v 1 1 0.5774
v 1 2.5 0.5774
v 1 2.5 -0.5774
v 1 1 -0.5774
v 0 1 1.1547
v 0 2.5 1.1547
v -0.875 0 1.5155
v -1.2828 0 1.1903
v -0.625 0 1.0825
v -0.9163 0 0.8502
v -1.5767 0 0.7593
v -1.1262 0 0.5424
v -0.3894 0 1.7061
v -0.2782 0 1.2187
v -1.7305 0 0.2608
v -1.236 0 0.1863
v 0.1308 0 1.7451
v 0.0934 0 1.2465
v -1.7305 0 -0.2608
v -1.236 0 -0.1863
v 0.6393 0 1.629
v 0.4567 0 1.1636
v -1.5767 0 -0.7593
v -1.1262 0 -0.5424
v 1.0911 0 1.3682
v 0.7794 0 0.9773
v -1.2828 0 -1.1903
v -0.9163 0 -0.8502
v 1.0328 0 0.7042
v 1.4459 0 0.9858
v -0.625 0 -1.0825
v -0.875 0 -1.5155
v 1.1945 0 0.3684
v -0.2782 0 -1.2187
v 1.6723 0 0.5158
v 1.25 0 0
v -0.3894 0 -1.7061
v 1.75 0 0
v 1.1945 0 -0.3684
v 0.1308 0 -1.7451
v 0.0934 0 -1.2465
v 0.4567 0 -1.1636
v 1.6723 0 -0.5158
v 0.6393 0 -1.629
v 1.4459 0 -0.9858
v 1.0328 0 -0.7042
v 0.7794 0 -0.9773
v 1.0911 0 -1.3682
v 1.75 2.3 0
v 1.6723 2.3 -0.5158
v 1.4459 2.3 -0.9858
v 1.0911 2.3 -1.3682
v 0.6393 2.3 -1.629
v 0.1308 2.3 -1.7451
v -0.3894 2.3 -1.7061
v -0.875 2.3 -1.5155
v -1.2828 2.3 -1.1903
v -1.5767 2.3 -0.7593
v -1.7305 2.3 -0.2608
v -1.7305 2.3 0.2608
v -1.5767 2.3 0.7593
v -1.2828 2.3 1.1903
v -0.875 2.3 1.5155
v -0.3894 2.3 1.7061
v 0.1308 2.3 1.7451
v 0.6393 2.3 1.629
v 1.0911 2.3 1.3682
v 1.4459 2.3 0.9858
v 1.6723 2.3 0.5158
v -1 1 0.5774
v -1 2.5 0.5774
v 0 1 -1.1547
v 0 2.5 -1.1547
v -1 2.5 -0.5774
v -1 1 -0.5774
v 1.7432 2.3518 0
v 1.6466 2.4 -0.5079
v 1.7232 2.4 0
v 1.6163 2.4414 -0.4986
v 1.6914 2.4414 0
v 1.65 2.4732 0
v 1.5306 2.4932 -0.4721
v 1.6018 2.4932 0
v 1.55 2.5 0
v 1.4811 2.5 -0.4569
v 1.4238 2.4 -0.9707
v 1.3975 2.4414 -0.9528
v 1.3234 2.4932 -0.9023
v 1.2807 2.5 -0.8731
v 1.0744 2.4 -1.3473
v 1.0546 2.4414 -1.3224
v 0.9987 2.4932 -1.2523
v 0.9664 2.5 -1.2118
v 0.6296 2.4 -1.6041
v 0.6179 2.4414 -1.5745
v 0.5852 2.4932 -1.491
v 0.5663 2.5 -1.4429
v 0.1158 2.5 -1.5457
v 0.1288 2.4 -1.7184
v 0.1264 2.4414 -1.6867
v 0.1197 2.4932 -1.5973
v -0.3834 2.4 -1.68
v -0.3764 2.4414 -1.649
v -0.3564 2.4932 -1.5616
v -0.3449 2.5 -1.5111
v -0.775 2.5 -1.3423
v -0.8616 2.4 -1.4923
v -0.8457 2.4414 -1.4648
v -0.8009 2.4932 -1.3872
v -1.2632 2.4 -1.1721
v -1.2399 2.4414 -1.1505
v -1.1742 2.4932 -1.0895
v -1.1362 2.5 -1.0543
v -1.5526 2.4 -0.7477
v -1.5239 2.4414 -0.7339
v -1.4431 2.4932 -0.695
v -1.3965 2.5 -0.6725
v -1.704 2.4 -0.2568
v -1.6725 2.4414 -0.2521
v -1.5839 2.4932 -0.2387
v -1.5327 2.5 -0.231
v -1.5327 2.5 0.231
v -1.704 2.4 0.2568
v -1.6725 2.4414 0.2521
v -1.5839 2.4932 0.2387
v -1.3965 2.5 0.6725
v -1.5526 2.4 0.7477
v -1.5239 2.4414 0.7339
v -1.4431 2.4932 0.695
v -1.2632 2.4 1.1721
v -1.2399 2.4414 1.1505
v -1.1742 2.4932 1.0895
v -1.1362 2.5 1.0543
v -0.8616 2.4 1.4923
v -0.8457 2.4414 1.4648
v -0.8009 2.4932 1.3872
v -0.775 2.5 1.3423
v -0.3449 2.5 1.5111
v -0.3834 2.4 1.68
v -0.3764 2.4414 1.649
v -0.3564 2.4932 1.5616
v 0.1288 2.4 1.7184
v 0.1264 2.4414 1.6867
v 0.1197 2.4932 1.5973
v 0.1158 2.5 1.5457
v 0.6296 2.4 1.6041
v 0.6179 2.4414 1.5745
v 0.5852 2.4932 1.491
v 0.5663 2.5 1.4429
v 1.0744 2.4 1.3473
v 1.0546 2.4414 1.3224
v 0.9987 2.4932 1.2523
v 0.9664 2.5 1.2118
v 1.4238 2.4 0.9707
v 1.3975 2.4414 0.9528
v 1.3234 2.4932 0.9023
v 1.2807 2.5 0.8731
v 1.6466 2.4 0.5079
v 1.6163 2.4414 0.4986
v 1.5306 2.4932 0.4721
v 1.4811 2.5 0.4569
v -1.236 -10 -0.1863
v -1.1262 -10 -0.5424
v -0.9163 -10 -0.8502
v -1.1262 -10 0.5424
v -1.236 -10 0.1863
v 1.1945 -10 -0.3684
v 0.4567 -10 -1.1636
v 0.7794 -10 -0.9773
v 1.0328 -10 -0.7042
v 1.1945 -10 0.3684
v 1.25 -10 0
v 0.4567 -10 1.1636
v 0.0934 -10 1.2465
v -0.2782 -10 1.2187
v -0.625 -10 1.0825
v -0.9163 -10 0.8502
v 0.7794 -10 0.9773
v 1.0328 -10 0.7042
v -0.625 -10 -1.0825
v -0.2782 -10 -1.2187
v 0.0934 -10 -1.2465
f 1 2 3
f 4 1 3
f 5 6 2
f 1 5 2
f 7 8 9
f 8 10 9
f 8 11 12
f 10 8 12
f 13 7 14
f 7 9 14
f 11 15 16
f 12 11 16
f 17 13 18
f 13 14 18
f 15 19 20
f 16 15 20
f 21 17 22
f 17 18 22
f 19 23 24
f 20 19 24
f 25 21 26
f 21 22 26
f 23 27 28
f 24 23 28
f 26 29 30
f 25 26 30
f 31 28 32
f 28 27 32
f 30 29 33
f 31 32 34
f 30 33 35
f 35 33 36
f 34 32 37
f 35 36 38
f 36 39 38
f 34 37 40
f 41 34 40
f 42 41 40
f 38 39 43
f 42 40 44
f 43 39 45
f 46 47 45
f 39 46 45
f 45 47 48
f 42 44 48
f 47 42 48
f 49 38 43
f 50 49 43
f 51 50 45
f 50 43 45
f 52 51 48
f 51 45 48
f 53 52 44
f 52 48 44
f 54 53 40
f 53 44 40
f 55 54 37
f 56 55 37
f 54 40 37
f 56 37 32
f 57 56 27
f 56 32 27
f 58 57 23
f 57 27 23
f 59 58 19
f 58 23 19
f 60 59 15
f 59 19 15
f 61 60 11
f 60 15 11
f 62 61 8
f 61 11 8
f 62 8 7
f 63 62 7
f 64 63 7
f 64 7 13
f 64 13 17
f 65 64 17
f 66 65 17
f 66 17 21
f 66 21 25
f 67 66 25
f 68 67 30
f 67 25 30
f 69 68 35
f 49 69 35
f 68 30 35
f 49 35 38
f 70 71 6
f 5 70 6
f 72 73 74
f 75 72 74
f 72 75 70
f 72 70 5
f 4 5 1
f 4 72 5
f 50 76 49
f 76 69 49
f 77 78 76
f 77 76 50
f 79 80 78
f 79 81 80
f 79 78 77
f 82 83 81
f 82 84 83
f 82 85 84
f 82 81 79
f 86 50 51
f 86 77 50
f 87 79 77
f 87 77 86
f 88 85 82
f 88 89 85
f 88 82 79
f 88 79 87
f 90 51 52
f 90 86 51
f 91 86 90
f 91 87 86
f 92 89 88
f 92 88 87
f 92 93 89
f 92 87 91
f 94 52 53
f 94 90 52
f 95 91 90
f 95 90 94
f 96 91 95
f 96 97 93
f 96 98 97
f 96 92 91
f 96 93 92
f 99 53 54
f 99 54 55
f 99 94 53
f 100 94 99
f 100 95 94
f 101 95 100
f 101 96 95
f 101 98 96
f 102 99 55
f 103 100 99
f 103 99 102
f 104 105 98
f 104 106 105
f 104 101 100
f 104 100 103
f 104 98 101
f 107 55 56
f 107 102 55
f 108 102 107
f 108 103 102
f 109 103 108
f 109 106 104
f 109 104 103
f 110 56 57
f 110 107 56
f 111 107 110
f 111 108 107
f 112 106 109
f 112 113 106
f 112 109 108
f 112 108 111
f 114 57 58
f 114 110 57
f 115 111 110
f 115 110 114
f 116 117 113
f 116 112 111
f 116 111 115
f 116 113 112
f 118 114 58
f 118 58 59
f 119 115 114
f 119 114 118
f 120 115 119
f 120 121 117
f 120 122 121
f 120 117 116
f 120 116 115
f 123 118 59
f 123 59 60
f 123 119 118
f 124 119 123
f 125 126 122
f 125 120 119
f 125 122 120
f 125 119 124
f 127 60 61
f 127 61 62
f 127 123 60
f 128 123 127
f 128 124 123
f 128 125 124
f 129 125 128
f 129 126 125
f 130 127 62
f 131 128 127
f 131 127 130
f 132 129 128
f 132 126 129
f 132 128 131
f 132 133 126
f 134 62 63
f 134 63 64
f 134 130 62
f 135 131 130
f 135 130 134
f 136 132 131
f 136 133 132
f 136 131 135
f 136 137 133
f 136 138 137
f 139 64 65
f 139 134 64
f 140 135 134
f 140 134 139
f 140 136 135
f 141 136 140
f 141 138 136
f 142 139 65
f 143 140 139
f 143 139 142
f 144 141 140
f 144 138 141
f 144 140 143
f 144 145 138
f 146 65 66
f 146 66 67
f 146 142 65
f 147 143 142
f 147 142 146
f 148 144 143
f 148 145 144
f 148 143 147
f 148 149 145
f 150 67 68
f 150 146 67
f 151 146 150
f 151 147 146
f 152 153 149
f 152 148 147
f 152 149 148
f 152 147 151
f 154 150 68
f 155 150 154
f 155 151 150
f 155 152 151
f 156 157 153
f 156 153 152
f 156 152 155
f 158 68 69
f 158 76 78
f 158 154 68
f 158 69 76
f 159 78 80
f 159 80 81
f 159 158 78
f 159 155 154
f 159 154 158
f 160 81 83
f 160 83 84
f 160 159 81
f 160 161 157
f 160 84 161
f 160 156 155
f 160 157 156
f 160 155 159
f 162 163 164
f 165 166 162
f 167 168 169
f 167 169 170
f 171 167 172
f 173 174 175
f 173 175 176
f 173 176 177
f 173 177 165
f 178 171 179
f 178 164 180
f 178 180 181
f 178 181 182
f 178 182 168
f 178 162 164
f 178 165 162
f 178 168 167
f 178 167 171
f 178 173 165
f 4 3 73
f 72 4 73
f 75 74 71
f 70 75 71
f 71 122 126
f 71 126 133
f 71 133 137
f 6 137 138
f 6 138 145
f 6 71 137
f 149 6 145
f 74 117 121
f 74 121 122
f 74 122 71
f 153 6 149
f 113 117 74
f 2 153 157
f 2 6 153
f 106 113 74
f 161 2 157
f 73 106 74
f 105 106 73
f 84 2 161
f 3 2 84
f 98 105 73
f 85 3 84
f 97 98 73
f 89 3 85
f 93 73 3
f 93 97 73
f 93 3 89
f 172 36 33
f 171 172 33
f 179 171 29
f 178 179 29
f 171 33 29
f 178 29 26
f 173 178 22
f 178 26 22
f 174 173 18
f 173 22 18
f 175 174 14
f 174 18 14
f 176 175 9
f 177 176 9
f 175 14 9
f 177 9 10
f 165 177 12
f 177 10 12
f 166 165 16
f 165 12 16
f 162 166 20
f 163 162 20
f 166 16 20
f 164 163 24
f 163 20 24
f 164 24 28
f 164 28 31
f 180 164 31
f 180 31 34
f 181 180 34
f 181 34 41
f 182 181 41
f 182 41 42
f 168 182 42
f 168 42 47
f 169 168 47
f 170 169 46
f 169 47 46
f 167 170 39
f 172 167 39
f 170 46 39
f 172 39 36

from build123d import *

# Parameters (mm, degrees)
SKETCH1_R           = 1.75
BOSS_EXTRUDE1_DEPTH = 2.5
SKETCH3_R           = 1.25
BOSS_EXTRUDE2_DEPTH = 10
FILLET1_R           = 0.2
CUT_EXTRUDE1_DEPTH  = 1.5


with BuildPart() as part:
    # Sketch1 → Boss-Extrude1 (new body)
    with BuildSketch(Plane(origin=(0, 0, 0), x_dir=(1, 0, 0), z_dir=(0, 1, 0))):
        Circle(SKETCH1_R)
    extrude(amount=BOSS_EXTRUDE1_DEPTH)

    # Sketch3 → Boss-Extrude2 (add)
    with BuildSketch(Plane.XZ):
        Circle(SKETCH3_R)
    extrude(amount=BOSS_EXTRUDE2_DEPTH)

    # Fillet1
    fillet1_edges = [part.edges().sort_by_distance(p)[0] for p in [
        (-1.75, 2.5, 0),
    ]]
    fillet(fillet1_edges, radius=FILLET1_R)

    # Sketch4 → Cut-Extrude1 (cut)
    with BuildSketch(Plane(origin=(0, 2.5, 0), x_dir=(1, 0, 0), z_dir=(0, 1, 0))):
        Polygon((0, -1.154700538), (1, -0.577350269), (1, 0.577350269), (0, 1.154700538), (-1, 0.577350269), (-1, -0.577350269), align=None)
    extrude(amount=-CUT_EXTRUDE1_DEPTH, mode=Mode.SUBTRACT)


solid = part.part
